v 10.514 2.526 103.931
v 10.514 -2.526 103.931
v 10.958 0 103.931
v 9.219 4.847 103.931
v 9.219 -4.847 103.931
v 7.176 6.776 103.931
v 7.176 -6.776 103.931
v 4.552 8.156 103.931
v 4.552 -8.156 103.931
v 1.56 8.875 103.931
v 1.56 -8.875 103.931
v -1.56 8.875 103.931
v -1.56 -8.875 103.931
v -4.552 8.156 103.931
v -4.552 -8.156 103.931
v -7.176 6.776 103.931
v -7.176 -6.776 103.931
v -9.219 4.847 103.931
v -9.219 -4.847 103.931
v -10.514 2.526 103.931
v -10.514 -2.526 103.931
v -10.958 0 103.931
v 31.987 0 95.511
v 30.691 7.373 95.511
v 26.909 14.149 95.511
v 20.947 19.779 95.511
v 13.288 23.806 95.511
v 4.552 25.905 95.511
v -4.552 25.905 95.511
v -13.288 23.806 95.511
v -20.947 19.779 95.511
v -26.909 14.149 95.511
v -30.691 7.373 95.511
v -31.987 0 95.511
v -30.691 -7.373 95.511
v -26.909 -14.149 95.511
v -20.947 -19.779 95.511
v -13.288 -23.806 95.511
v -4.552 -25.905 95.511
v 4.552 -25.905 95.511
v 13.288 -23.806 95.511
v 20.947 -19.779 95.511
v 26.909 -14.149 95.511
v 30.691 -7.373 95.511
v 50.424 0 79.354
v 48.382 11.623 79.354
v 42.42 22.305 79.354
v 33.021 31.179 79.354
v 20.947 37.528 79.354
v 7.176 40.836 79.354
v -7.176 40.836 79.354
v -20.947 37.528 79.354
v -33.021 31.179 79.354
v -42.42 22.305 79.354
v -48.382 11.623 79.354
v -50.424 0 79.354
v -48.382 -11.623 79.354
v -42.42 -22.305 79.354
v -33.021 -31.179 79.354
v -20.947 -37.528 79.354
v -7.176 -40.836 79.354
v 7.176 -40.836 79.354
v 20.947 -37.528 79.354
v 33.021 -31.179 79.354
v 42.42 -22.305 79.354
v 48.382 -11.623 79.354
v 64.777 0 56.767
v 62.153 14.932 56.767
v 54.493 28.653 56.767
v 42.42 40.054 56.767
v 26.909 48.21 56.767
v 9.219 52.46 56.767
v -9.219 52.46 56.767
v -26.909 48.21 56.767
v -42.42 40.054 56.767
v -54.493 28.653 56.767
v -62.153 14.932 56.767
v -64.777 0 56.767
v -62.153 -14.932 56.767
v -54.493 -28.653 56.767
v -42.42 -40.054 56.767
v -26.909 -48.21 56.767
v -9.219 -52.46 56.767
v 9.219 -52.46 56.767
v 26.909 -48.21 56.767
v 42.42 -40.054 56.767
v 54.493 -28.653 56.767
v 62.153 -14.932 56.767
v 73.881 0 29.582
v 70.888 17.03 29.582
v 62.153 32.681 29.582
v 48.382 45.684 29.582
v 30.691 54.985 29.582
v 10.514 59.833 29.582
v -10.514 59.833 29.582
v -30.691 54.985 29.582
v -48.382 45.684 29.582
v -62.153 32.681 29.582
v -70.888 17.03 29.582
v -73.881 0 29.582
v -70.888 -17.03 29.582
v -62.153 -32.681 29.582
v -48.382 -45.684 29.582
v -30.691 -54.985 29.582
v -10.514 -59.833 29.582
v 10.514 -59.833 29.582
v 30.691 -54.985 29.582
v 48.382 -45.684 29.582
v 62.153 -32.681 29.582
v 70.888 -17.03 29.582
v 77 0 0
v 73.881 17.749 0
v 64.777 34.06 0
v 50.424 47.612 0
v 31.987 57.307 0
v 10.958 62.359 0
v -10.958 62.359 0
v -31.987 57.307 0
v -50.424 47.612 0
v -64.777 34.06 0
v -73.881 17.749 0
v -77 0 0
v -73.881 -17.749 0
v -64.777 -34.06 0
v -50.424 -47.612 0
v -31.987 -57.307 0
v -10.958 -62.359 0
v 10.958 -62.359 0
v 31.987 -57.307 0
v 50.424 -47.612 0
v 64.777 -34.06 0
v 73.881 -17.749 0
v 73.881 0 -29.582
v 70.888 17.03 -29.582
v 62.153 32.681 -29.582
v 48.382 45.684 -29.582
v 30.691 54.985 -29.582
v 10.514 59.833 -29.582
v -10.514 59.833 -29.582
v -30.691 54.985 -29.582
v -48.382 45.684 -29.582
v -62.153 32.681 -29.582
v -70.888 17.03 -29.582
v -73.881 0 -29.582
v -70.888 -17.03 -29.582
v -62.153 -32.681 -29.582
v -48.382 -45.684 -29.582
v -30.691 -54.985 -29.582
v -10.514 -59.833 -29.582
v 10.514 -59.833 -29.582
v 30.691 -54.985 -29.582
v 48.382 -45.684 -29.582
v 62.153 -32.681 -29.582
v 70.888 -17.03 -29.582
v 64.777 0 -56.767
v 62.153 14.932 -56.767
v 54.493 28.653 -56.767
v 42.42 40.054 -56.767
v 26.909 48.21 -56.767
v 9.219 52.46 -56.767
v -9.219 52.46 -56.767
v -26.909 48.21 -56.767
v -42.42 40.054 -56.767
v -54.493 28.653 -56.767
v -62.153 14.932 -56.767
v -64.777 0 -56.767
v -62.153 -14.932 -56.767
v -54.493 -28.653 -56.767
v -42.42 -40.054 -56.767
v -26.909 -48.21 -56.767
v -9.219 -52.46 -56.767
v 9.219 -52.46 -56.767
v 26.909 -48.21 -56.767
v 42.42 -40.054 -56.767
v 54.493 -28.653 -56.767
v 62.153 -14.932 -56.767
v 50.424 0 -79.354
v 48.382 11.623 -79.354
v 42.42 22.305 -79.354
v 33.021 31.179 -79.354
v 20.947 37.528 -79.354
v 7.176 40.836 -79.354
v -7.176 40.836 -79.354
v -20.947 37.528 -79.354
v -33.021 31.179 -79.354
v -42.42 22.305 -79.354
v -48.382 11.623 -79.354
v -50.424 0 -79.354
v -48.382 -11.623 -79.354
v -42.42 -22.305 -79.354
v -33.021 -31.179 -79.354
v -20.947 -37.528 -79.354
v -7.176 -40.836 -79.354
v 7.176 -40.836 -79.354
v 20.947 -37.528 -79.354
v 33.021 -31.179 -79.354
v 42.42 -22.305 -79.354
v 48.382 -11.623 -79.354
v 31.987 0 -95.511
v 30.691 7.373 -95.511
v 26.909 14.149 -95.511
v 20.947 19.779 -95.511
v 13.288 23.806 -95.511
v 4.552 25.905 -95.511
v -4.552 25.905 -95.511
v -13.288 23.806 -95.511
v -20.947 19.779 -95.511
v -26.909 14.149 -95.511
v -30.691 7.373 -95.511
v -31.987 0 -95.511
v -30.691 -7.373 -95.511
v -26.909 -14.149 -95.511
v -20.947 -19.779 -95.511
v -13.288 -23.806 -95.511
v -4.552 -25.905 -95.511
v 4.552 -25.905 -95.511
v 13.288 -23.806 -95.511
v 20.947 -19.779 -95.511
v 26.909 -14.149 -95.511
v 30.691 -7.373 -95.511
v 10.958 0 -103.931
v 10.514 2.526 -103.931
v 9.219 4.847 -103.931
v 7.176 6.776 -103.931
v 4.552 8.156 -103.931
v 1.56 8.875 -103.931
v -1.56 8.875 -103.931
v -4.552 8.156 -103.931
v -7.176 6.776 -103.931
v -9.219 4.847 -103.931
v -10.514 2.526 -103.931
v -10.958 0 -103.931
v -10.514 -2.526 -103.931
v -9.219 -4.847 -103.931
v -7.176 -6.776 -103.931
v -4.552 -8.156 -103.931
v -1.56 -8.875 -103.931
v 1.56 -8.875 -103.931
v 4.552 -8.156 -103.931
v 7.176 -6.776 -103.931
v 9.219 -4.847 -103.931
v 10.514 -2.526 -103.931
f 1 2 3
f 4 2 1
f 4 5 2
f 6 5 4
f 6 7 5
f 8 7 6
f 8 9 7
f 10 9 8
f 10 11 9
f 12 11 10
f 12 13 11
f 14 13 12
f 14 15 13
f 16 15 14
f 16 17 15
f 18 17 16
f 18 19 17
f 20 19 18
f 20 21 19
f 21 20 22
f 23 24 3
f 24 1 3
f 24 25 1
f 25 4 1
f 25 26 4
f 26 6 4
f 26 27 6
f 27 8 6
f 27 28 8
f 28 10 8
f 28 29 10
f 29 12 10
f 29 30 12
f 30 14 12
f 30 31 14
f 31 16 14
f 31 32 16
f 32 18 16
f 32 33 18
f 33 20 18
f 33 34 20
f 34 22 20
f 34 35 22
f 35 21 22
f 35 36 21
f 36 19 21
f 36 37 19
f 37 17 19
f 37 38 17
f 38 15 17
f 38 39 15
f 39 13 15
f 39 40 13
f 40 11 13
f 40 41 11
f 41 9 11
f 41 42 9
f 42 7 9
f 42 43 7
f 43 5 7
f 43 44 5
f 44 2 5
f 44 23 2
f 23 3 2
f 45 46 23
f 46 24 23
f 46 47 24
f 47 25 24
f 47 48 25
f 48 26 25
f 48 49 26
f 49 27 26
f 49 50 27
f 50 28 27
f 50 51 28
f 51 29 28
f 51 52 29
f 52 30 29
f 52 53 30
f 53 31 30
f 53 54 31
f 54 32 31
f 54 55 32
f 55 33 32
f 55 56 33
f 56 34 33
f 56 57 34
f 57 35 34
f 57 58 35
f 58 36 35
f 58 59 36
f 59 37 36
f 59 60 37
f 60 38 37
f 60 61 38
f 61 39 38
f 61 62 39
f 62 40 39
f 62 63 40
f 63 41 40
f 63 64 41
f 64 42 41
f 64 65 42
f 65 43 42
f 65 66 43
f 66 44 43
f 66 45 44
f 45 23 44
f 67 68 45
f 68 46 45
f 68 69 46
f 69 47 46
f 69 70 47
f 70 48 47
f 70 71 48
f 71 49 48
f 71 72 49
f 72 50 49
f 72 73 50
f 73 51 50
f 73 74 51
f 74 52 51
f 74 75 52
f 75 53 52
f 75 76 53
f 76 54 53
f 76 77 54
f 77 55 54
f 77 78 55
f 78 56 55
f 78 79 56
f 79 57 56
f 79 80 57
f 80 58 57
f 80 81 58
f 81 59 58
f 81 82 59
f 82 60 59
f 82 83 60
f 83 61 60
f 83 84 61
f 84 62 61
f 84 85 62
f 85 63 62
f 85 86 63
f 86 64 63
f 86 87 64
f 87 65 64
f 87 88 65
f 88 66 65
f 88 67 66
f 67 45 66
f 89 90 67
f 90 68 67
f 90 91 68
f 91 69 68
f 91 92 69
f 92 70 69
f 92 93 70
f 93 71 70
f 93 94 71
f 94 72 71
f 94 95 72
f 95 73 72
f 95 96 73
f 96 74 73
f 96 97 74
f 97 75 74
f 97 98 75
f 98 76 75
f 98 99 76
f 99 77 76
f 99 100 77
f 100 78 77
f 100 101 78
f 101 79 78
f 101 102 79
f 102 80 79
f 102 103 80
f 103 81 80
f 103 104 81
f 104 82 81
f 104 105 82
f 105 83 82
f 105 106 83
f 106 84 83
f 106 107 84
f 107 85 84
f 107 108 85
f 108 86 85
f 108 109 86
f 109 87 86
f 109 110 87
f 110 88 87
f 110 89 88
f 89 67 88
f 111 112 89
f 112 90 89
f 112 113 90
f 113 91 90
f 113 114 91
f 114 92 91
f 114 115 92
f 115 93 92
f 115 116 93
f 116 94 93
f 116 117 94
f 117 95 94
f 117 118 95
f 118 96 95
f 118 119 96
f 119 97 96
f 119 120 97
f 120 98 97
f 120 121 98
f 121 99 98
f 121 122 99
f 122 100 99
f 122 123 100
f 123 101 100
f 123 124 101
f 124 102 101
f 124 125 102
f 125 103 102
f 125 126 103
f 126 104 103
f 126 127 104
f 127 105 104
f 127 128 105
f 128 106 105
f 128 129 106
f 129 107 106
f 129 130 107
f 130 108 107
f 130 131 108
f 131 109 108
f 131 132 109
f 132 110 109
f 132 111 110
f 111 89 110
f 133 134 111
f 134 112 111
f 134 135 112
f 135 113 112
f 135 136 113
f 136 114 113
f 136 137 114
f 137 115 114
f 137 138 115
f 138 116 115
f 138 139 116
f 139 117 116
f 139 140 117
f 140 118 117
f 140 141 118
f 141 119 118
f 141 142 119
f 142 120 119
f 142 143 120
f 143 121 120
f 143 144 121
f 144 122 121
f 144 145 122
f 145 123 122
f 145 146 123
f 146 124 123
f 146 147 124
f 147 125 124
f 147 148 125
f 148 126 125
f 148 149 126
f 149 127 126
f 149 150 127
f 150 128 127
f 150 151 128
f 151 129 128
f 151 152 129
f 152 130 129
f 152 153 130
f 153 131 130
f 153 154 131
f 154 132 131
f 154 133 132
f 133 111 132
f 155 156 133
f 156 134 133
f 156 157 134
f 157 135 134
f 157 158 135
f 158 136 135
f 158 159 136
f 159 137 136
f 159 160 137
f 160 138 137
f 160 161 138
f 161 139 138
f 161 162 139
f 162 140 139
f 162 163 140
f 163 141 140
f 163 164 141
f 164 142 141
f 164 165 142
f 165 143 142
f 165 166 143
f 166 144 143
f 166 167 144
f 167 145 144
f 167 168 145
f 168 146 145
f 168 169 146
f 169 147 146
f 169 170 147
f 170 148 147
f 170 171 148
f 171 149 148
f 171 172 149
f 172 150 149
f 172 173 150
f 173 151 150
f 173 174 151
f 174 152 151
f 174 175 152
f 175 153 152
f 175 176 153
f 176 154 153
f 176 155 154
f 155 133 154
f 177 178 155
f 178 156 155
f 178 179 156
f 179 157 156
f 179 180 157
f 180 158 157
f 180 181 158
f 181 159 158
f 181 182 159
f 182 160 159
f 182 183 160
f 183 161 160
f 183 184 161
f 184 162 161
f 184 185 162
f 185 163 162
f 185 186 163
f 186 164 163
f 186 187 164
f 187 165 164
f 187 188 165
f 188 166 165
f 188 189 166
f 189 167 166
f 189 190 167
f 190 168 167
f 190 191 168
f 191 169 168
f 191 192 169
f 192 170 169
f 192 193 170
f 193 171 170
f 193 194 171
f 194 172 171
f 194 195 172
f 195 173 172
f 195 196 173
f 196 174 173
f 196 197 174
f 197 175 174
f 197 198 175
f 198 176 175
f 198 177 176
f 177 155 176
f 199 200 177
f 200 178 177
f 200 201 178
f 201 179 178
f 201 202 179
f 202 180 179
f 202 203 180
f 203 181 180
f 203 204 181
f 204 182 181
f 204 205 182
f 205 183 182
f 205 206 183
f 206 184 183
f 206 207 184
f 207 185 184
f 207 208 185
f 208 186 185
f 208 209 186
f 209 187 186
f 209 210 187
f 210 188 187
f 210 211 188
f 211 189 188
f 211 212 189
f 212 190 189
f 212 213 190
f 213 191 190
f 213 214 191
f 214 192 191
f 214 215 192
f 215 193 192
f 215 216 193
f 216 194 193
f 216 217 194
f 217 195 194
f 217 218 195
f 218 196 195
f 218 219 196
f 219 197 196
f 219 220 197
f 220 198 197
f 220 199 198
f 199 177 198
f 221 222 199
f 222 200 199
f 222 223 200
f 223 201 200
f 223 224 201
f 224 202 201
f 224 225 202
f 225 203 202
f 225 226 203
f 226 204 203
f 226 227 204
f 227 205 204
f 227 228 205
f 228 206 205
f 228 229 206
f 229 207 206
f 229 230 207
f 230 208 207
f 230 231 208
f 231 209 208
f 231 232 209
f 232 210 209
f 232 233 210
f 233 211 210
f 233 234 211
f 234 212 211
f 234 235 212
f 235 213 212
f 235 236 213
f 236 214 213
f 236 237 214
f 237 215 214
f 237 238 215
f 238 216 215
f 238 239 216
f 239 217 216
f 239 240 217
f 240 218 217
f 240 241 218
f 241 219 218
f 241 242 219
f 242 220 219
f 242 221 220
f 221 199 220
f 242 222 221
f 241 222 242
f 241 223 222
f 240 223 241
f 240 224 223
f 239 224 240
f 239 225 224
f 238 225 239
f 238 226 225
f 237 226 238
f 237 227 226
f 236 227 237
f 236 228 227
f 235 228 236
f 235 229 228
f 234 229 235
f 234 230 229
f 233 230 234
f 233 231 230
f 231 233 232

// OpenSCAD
// Generated by SolidPython 1.0.1 on 2020-07-29 00:46:49


scale(v = [11, 9, 15]) {
	sphere(r = 7);
}
/***********************************************
*********      SolidPython code:      **********
************************************************
 
# import packages: SolidPython
from solid import *
from solid.utils import *
from itertools import chain, combinations, permutations


class Resize:

    def __init__(self, scad_file):
        self.scad_file = scad_file
        #self.scad_file = import_scad(scad_file)
        # cone/cylinder param:
        self.r1 = 0
        self.r2 = 0
        self.h = 0
        # rectangular prism param:
        self.w = 0
        self.l = 0
        # ellipse param:
        self.r = 0

    # import OpenScad code (file name corresponds to shape)


    # classify shape + parameters
    def assign(self, param1, param2, param3):
        if self.scad_file == 'cone.scad':
            self.r1 = param1
            self.r2 = param2
            self.h = param3
        elif self.scad_file == 'cylinder.scad':
            self.r1 = param1
            self.r2 = param2
            self.h = param3
        elif self.scad_file == 'rectangularPrism.scad':
            self.h = param1
            self.l = param2
            self.w = param3
        else:
            self.r = param1
            self.h = param2

    # resize parameters
    def iterate(self):
        x = range(3, 20, 2)
        i = 1
        if self.scad_file == 'cone.scad':
            tempList = list(permutations(x, 2))
            for temp in tempList:
                param1 = temp[0]
                param2 = temp[1]
                filepath = 'produced_scad_files/' + 'cone' + str(param1) + '_' + str(param2) + '_' + '.scad'
                scad_render_to_file(cylinder(h=param1, r1=param2, r2=0), filepath)

        elif self.scad_file == 'cylinder.scad':
            tempList = list(permutations(x, 3))
            for temp in tempList:
                param1 = temp[0]
                param2 = temp[1]
                filepath = 'produced_scad_files/' + 'cylinder' + str(param1) + '_' + str(param2) + '_' + '.scad'
                scad_render_to_file(cylinder(h=param1, r1=param2, r2=param2), filepath)

        elif self.scad_file == 'rectangularPrism.scad':
            tempList = list(permutations(x, 3))
            for temp in tempList:
                param1 = temp[0]
                param2 = temp[1]
                param3 = temp[2]
                filepath = 'produced_scad_files/' + 'rectangularPrism' + str(param1) + '_' + str(param2) + '_' + str(
                    param3) + '.scad'
                scad_render_to_file(cube(size=(param1, param2, param3)), filepath)

        elif self.scad_file == 'ellipse.scad':
            tempList = list(permutations(x, 4))
            for temp in tempList:
                param1 = temp[0]
                param2 = temp[1]
                param3 = temp[2]
                param4 = temp[3]
                filepath = 'produced_scad_files/' + 'ellipse' + str(param1) + '_' + str(param2) + '_' + str(param3) + '_' + str(param4) + '.scad'
                scad_render_to_file(scale([param1, param2, param3])(sphere(r=param4)), filepath)

    def render_to_scadfile(self):
        scad_render_to_file(scad, 'example.scad') 
 
************************************************/
